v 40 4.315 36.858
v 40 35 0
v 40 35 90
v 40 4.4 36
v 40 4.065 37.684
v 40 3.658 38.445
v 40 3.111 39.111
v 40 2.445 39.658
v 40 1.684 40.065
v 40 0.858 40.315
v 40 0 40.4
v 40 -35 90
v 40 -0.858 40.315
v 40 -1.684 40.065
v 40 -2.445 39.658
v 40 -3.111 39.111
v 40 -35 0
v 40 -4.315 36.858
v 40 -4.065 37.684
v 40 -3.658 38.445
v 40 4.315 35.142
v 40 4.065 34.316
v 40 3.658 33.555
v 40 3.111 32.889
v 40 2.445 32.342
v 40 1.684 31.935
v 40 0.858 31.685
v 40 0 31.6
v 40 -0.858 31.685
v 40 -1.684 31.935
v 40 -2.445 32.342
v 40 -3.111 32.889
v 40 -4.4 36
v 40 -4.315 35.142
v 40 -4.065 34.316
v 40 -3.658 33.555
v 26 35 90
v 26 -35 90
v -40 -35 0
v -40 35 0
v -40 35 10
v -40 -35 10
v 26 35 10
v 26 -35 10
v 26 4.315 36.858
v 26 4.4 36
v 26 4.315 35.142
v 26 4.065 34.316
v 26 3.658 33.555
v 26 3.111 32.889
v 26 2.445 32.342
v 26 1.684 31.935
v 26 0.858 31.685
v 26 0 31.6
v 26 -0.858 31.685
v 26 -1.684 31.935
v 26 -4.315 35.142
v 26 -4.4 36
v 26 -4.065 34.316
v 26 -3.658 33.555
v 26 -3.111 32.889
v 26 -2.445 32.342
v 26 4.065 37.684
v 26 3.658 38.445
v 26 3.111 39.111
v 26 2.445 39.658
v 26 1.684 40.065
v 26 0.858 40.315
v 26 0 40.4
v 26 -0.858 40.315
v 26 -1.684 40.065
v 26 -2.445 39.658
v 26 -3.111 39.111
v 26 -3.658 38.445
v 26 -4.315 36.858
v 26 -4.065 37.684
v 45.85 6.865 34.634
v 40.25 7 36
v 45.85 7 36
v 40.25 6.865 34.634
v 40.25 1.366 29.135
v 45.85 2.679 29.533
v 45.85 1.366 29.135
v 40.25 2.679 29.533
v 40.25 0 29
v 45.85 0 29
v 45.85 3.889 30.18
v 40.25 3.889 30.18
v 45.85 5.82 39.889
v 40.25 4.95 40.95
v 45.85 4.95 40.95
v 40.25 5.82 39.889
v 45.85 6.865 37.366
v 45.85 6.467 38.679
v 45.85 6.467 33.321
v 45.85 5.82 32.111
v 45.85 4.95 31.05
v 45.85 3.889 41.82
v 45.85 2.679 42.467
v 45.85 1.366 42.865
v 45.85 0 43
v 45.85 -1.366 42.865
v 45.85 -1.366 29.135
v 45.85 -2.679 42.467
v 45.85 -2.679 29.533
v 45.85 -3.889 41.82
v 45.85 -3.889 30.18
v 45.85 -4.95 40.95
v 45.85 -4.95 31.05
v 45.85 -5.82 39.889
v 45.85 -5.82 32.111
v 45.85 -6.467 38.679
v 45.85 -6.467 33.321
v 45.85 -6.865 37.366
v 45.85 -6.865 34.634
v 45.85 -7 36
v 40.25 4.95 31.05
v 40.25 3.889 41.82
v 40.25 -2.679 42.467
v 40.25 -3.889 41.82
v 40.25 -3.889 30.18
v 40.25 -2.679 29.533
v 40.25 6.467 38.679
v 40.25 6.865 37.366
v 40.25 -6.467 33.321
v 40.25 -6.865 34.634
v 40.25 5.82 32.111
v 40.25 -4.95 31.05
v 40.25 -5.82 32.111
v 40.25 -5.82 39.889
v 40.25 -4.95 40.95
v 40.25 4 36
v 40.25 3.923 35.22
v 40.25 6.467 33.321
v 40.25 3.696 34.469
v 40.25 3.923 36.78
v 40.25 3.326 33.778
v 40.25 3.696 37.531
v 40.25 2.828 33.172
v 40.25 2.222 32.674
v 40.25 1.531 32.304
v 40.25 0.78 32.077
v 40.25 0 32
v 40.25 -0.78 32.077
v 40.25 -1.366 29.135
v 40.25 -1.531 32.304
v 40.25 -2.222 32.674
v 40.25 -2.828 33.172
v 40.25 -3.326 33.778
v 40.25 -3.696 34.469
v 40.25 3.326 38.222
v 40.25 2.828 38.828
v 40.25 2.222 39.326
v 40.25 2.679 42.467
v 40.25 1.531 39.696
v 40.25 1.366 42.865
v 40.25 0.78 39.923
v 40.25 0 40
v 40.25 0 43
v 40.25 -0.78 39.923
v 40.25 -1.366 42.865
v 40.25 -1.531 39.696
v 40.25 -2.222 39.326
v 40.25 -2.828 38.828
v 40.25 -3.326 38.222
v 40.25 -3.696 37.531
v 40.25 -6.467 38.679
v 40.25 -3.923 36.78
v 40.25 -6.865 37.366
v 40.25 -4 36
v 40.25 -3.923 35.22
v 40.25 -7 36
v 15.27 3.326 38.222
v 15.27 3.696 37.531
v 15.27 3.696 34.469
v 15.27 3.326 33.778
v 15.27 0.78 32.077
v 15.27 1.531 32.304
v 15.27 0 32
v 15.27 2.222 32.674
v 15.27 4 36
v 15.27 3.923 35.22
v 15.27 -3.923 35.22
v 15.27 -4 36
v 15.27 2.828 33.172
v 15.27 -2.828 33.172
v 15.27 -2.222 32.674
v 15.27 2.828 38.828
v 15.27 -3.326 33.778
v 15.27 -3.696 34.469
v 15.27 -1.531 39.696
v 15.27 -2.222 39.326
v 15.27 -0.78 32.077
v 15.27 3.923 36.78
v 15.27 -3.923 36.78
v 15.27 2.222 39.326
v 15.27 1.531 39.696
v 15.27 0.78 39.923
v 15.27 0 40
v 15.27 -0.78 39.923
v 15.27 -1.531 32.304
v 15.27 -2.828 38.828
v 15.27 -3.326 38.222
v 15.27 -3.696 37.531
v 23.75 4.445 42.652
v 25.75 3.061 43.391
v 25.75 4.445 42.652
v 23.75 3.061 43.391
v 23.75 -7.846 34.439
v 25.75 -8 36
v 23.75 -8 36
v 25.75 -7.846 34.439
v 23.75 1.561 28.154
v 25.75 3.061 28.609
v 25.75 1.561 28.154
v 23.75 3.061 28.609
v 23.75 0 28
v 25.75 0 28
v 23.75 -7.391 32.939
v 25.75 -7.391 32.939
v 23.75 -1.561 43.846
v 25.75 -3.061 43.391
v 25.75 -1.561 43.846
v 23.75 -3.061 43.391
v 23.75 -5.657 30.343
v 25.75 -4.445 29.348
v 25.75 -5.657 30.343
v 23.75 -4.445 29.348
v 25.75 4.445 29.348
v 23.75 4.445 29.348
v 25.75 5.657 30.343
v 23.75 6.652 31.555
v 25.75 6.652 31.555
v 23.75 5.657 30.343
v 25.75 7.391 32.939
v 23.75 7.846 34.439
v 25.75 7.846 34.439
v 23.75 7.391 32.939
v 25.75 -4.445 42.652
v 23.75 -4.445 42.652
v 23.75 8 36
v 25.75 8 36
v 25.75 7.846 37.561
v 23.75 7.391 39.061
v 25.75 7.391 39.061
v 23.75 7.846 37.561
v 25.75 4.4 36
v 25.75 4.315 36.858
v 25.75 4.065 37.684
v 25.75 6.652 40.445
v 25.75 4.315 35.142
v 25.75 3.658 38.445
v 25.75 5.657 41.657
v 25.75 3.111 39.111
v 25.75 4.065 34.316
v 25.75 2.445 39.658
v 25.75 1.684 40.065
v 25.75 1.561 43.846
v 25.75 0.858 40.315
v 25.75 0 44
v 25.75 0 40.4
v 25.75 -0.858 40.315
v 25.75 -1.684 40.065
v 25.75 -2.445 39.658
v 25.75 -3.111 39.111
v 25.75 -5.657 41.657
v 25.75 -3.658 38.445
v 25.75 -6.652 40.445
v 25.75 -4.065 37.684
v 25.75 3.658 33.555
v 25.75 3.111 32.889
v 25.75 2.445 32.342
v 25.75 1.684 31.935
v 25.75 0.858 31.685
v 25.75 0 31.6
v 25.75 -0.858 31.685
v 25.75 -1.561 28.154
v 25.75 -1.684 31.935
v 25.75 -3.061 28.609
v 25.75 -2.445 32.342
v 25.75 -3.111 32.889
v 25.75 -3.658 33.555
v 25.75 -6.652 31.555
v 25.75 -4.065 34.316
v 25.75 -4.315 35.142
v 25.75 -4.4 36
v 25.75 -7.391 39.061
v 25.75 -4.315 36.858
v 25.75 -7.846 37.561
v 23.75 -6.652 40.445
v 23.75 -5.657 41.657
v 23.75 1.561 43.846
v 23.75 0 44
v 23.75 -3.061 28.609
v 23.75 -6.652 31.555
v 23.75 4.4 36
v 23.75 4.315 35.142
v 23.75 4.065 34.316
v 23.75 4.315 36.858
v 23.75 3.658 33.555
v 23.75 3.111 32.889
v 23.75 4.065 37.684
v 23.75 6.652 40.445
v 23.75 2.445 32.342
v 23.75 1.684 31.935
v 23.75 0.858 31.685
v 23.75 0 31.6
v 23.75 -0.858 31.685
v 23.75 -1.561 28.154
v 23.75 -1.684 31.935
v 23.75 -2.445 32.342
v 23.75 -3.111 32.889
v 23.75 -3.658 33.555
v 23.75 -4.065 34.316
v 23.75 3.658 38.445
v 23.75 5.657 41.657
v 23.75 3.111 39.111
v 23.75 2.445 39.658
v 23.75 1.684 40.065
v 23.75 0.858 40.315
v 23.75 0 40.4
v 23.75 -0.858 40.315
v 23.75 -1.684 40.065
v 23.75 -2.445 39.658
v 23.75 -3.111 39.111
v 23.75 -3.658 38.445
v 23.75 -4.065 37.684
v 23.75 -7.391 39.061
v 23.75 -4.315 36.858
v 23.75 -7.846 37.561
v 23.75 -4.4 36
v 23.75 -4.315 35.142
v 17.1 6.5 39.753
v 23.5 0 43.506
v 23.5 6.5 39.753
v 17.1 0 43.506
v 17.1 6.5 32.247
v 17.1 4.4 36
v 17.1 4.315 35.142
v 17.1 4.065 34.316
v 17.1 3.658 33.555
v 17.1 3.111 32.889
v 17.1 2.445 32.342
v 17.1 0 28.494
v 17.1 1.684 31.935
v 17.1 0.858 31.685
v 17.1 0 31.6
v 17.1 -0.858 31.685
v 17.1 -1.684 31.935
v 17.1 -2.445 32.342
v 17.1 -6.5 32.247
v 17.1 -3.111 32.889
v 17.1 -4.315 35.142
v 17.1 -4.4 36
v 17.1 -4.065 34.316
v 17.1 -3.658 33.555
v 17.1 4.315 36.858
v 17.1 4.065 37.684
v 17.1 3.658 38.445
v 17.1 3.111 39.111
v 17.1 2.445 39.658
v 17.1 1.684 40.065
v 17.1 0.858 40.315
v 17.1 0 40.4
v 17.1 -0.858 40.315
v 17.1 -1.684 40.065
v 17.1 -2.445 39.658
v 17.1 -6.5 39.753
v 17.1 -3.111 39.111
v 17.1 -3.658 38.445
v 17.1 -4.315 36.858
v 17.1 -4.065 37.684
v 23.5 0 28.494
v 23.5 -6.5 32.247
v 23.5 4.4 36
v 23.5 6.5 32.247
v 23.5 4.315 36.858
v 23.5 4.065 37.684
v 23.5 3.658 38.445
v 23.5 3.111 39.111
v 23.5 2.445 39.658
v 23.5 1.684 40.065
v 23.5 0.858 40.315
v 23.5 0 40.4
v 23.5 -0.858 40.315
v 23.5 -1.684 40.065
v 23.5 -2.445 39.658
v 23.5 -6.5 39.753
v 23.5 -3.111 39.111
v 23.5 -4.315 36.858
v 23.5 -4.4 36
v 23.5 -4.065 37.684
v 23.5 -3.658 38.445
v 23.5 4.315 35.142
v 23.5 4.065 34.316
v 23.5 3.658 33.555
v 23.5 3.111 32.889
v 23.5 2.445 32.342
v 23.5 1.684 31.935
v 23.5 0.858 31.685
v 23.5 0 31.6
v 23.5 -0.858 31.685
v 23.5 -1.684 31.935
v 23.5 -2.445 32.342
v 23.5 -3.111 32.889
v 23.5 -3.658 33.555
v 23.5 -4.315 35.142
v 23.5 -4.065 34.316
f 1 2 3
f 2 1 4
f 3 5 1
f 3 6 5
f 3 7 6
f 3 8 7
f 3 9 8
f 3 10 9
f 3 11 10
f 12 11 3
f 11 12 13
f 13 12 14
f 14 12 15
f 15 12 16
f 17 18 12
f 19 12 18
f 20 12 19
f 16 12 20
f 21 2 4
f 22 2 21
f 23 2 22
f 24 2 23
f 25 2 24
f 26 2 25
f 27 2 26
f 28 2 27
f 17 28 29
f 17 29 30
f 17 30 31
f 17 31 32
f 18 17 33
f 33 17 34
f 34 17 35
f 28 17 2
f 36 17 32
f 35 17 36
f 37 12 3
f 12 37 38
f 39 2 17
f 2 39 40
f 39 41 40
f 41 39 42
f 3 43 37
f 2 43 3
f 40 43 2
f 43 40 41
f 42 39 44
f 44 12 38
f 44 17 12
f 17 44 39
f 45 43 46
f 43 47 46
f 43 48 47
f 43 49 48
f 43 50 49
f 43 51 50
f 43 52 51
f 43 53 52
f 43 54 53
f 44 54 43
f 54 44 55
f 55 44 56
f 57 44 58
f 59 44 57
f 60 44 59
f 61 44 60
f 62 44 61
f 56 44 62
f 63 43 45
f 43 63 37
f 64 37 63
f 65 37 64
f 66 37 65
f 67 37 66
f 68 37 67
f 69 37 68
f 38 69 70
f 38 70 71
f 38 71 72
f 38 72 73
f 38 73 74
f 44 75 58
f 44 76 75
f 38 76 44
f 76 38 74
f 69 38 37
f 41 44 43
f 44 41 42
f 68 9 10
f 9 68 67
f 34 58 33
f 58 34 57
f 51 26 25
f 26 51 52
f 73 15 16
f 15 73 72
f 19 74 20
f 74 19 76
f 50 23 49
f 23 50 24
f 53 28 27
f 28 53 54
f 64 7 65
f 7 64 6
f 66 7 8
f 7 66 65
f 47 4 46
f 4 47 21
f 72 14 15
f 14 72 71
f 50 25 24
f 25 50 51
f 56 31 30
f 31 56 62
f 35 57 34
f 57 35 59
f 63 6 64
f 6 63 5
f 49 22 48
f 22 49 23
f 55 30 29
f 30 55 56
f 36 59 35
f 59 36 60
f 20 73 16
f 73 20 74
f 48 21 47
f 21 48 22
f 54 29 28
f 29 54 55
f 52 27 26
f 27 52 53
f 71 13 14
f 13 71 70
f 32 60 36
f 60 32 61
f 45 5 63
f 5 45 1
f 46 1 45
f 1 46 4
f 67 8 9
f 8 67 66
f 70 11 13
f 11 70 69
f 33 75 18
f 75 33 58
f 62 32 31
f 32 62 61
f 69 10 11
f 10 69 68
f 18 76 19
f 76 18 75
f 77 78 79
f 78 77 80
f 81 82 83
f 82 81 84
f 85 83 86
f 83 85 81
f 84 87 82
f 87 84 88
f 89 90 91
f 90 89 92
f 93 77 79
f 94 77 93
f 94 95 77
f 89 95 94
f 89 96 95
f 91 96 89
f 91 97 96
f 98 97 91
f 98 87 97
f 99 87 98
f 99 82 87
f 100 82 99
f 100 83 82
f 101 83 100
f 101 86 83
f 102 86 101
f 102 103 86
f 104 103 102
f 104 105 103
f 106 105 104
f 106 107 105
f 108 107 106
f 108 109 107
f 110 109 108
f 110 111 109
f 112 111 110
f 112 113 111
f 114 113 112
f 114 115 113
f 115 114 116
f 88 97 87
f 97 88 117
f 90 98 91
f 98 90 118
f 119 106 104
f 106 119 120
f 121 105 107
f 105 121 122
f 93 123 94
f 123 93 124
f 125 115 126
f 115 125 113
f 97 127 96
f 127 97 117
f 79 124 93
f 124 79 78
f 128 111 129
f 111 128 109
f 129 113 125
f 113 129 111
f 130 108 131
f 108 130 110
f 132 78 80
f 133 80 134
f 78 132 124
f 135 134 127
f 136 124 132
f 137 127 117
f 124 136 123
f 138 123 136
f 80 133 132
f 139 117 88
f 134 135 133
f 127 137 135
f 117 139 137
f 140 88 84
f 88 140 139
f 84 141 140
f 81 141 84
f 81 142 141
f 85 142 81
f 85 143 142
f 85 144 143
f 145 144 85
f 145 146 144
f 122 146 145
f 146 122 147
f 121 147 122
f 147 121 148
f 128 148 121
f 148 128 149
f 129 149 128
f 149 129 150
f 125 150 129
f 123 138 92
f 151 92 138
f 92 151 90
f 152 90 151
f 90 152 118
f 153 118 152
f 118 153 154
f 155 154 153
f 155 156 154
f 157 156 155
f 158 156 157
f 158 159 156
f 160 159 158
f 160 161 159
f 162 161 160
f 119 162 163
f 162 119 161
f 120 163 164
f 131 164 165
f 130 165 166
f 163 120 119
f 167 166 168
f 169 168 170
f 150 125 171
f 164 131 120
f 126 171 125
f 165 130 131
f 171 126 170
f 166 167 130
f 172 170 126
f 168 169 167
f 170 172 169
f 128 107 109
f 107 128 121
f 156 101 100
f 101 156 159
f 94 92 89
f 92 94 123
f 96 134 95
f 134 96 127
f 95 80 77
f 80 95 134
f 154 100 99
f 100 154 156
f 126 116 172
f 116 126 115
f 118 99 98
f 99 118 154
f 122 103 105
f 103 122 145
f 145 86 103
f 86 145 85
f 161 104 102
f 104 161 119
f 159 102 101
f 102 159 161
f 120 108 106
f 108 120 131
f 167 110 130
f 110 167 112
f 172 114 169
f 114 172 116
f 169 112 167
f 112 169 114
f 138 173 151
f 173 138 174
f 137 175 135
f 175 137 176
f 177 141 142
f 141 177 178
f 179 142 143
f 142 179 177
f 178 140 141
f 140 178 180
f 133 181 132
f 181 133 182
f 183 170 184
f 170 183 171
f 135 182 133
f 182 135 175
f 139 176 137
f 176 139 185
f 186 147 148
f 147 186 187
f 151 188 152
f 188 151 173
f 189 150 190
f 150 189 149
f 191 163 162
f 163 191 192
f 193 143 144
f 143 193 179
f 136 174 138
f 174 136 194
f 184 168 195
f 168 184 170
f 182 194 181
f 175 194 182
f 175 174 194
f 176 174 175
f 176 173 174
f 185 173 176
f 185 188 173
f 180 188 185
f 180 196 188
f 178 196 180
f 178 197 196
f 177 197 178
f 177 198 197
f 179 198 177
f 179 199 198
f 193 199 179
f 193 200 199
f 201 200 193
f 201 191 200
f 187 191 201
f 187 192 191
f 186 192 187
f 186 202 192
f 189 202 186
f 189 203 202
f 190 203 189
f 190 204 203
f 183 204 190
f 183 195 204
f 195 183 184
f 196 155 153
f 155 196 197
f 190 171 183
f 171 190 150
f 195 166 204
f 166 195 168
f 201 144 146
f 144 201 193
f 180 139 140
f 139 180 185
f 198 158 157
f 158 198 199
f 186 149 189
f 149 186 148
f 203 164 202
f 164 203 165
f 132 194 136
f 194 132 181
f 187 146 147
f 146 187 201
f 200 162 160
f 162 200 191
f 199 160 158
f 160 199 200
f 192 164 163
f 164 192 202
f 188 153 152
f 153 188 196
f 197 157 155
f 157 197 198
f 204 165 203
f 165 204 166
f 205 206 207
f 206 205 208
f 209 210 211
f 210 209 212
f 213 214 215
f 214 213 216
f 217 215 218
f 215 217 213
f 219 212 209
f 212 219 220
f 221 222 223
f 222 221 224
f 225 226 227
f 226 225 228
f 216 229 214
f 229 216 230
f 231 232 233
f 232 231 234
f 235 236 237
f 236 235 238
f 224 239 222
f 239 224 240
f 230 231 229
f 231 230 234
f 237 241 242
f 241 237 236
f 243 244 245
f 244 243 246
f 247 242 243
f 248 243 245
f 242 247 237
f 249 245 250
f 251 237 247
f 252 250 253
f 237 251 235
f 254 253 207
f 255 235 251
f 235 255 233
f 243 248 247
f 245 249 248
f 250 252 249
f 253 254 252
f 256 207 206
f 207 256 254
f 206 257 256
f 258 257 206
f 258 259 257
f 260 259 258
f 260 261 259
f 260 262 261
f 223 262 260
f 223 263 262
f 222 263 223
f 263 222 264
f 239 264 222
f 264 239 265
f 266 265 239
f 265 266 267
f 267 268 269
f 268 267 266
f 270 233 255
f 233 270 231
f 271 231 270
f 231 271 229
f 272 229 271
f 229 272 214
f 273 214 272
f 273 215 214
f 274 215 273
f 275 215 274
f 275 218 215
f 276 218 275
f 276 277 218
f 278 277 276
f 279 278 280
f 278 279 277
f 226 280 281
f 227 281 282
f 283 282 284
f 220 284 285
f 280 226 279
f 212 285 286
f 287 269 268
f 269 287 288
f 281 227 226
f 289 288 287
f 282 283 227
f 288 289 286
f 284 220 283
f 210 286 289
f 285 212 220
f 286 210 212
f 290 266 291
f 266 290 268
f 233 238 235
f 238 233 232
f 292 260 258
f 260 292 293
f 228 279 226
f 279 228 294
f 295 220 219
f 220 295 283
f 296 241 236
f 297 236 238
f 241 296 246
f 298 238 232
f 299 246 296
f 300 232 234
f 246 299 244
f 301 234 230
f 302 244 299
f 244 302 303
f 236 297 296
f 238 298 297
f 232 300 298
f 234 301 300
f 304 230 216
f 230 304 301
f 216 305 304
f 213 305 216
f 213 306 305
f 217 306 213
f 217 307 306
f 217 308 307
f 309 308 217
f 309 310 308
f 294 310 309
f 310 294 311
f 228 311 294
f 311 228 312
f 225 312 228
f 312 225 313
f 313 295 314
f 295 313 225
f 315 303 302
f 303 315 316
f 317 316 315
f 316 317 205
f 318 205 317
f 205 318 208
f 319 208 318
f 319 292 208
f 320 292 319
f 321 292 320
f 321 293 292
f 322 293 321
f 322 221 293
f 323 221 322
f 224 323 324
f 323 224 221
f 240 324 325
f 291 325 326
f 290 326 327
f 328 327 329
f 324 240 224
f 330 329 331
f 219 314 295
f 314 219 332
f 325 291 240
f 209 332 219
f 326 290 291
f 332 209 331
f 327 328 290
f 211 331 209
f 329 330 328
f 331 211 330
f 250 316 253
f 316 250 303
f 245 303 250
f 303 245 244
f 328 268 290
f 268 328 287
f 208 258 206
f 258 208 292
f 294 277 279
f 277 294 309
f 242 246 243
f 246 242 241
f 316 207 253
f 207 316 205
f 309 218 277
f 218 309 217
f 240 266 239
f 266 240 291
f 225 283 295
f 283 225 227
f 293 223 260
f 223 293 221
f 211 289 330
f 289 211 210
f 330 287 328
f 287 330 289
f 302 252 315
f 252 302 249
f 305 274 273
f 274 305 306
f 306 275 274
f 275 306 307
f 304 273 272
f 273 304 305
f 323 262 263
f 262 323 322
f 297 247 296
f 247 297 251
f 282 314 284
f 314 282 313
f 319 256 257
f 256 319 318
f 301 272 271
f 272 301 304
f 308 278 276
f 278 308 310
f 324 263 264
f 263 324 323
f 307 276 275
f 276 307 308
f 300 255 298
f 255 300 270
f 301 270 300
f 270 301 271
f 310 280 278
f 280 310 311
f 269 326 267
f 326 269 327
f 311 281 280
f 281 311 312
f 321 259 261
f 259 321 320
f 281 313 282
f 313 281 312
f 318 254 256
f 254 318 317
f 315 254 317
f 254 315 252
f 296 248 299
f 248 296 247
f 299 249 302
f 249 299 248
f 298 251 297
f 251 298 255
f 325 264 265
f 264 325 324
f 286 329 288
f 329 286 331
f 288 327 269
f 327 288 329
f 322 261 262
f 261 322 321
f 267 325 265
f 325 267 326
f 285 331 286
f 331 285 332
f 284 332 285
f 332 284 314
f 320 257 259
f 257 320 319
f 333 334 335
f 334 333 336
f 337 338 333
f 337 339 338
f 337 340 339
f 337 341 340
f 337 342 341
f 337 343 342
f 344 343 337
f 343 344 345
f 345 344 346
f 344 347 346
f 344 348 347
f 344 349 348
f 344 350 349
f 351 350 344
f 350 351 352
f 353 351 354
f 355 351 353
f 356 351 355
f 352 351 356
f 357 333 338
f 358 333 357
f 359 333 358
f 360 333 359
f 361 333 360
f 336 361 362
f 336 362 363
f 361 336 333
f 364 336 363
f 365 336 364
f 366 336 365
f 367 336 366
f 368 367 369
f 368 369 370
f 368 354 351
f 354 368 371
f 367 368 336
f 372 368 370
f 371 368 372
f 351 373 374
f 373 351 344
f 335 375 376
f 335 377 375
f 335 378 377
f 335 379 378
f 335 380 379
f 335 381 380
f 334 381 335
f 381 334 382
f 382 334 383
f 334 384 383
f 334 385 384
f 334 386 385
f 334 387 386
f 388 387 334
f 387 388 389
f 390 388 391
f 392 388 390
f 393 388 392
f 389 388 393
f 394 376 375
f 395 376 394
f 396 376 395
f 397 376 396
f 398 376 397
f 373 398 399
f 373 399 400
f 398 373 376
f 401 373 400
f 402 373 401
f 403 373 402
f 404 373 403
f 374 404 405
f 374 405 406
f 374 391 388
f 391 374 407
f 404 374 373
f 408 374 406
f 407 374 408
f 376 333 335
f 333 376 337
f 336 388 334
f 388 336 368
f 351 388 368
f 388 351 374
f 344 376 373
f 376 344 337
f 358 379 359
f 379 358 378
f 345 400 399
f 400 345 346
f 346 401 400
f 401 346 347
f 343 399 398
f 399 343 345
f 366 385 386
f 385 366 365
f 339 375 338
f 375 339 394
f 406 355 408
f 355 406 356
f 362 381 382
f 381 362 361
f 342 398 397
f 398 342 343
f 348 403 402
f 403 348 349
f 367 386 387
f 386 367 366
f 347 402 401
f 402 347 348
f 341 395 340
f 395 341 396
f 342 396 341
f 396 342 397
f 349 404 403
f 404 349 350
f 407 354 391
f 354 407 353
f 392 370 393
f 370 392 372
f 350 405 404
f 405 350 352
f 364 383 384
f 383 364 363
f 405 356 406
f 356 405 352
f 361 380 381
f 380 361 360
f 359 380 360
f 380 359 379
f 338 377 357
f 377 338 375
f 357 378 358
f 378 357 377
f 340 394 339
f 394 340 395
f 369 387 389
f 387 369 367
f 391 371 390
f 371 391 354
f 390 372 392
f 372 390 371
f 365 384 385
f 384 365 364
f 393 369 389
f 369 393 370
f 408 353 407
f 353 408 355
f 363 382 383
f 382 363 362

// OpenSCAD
$fn = 32;

// ------------------------------------------------------------------------
// Bolted bracket: 80 x 70 mm bracket with 1 bolt joints
// Every part is its own module, assembly() places them once.
// ------------------------------------------------------------------------

// --- part 1 ---
module bracket() {
  difference() {
    translate([-40, -35, 0]) cube([80, 70, 90]);
    translate([-41, -36, 10]) cube([67, 72, 81]);
    translate([33, 0, 36]) rotate([0, 90, 0]) cylinder(h = 16, d = 8.8, center = true);
  }
}

// --- part 2 ---
module bolt() {
  cylinder(h = 5.6, d = 14);
  translate([0, 0, -24.98]) cylinder(h = 24.98, d = 8);
}

// --- part 3 ---
module washer() {
  difference() {
      translate([0, 0, 0]) cylinder(h = 2, d = 16);
      translate([0, 0, -1]) cylinder(h = 4, d = 8.8);
    }
}

// --- part 4 ---
module nut() {
  difference() {
    linear_extrude(height = 6.4) polygon(points = [[7.506, 0], [3.753, 6.5], [-3.753, 6.5], [-7.506, 0], [-3.753, -6.5], [3.753, -6.5]]);
    translate([0, 0, -1]) cylinder(h = 8.4, d = 8.8);
  }
}

// --- assembly ---
module assembly() {
  translate([0, 0, 0]) rotate([0, 0, 0]) bracket();
  translate([40.25, 0, 36]) rotate([0, 90, 0]) bolt();
  translate([23.75, 0, 36]) rotate([0, 90, 0]) washer();
  translate([17.1, 0, 36]) rotate([0, 90, 0]) nut();
}

assembly();
